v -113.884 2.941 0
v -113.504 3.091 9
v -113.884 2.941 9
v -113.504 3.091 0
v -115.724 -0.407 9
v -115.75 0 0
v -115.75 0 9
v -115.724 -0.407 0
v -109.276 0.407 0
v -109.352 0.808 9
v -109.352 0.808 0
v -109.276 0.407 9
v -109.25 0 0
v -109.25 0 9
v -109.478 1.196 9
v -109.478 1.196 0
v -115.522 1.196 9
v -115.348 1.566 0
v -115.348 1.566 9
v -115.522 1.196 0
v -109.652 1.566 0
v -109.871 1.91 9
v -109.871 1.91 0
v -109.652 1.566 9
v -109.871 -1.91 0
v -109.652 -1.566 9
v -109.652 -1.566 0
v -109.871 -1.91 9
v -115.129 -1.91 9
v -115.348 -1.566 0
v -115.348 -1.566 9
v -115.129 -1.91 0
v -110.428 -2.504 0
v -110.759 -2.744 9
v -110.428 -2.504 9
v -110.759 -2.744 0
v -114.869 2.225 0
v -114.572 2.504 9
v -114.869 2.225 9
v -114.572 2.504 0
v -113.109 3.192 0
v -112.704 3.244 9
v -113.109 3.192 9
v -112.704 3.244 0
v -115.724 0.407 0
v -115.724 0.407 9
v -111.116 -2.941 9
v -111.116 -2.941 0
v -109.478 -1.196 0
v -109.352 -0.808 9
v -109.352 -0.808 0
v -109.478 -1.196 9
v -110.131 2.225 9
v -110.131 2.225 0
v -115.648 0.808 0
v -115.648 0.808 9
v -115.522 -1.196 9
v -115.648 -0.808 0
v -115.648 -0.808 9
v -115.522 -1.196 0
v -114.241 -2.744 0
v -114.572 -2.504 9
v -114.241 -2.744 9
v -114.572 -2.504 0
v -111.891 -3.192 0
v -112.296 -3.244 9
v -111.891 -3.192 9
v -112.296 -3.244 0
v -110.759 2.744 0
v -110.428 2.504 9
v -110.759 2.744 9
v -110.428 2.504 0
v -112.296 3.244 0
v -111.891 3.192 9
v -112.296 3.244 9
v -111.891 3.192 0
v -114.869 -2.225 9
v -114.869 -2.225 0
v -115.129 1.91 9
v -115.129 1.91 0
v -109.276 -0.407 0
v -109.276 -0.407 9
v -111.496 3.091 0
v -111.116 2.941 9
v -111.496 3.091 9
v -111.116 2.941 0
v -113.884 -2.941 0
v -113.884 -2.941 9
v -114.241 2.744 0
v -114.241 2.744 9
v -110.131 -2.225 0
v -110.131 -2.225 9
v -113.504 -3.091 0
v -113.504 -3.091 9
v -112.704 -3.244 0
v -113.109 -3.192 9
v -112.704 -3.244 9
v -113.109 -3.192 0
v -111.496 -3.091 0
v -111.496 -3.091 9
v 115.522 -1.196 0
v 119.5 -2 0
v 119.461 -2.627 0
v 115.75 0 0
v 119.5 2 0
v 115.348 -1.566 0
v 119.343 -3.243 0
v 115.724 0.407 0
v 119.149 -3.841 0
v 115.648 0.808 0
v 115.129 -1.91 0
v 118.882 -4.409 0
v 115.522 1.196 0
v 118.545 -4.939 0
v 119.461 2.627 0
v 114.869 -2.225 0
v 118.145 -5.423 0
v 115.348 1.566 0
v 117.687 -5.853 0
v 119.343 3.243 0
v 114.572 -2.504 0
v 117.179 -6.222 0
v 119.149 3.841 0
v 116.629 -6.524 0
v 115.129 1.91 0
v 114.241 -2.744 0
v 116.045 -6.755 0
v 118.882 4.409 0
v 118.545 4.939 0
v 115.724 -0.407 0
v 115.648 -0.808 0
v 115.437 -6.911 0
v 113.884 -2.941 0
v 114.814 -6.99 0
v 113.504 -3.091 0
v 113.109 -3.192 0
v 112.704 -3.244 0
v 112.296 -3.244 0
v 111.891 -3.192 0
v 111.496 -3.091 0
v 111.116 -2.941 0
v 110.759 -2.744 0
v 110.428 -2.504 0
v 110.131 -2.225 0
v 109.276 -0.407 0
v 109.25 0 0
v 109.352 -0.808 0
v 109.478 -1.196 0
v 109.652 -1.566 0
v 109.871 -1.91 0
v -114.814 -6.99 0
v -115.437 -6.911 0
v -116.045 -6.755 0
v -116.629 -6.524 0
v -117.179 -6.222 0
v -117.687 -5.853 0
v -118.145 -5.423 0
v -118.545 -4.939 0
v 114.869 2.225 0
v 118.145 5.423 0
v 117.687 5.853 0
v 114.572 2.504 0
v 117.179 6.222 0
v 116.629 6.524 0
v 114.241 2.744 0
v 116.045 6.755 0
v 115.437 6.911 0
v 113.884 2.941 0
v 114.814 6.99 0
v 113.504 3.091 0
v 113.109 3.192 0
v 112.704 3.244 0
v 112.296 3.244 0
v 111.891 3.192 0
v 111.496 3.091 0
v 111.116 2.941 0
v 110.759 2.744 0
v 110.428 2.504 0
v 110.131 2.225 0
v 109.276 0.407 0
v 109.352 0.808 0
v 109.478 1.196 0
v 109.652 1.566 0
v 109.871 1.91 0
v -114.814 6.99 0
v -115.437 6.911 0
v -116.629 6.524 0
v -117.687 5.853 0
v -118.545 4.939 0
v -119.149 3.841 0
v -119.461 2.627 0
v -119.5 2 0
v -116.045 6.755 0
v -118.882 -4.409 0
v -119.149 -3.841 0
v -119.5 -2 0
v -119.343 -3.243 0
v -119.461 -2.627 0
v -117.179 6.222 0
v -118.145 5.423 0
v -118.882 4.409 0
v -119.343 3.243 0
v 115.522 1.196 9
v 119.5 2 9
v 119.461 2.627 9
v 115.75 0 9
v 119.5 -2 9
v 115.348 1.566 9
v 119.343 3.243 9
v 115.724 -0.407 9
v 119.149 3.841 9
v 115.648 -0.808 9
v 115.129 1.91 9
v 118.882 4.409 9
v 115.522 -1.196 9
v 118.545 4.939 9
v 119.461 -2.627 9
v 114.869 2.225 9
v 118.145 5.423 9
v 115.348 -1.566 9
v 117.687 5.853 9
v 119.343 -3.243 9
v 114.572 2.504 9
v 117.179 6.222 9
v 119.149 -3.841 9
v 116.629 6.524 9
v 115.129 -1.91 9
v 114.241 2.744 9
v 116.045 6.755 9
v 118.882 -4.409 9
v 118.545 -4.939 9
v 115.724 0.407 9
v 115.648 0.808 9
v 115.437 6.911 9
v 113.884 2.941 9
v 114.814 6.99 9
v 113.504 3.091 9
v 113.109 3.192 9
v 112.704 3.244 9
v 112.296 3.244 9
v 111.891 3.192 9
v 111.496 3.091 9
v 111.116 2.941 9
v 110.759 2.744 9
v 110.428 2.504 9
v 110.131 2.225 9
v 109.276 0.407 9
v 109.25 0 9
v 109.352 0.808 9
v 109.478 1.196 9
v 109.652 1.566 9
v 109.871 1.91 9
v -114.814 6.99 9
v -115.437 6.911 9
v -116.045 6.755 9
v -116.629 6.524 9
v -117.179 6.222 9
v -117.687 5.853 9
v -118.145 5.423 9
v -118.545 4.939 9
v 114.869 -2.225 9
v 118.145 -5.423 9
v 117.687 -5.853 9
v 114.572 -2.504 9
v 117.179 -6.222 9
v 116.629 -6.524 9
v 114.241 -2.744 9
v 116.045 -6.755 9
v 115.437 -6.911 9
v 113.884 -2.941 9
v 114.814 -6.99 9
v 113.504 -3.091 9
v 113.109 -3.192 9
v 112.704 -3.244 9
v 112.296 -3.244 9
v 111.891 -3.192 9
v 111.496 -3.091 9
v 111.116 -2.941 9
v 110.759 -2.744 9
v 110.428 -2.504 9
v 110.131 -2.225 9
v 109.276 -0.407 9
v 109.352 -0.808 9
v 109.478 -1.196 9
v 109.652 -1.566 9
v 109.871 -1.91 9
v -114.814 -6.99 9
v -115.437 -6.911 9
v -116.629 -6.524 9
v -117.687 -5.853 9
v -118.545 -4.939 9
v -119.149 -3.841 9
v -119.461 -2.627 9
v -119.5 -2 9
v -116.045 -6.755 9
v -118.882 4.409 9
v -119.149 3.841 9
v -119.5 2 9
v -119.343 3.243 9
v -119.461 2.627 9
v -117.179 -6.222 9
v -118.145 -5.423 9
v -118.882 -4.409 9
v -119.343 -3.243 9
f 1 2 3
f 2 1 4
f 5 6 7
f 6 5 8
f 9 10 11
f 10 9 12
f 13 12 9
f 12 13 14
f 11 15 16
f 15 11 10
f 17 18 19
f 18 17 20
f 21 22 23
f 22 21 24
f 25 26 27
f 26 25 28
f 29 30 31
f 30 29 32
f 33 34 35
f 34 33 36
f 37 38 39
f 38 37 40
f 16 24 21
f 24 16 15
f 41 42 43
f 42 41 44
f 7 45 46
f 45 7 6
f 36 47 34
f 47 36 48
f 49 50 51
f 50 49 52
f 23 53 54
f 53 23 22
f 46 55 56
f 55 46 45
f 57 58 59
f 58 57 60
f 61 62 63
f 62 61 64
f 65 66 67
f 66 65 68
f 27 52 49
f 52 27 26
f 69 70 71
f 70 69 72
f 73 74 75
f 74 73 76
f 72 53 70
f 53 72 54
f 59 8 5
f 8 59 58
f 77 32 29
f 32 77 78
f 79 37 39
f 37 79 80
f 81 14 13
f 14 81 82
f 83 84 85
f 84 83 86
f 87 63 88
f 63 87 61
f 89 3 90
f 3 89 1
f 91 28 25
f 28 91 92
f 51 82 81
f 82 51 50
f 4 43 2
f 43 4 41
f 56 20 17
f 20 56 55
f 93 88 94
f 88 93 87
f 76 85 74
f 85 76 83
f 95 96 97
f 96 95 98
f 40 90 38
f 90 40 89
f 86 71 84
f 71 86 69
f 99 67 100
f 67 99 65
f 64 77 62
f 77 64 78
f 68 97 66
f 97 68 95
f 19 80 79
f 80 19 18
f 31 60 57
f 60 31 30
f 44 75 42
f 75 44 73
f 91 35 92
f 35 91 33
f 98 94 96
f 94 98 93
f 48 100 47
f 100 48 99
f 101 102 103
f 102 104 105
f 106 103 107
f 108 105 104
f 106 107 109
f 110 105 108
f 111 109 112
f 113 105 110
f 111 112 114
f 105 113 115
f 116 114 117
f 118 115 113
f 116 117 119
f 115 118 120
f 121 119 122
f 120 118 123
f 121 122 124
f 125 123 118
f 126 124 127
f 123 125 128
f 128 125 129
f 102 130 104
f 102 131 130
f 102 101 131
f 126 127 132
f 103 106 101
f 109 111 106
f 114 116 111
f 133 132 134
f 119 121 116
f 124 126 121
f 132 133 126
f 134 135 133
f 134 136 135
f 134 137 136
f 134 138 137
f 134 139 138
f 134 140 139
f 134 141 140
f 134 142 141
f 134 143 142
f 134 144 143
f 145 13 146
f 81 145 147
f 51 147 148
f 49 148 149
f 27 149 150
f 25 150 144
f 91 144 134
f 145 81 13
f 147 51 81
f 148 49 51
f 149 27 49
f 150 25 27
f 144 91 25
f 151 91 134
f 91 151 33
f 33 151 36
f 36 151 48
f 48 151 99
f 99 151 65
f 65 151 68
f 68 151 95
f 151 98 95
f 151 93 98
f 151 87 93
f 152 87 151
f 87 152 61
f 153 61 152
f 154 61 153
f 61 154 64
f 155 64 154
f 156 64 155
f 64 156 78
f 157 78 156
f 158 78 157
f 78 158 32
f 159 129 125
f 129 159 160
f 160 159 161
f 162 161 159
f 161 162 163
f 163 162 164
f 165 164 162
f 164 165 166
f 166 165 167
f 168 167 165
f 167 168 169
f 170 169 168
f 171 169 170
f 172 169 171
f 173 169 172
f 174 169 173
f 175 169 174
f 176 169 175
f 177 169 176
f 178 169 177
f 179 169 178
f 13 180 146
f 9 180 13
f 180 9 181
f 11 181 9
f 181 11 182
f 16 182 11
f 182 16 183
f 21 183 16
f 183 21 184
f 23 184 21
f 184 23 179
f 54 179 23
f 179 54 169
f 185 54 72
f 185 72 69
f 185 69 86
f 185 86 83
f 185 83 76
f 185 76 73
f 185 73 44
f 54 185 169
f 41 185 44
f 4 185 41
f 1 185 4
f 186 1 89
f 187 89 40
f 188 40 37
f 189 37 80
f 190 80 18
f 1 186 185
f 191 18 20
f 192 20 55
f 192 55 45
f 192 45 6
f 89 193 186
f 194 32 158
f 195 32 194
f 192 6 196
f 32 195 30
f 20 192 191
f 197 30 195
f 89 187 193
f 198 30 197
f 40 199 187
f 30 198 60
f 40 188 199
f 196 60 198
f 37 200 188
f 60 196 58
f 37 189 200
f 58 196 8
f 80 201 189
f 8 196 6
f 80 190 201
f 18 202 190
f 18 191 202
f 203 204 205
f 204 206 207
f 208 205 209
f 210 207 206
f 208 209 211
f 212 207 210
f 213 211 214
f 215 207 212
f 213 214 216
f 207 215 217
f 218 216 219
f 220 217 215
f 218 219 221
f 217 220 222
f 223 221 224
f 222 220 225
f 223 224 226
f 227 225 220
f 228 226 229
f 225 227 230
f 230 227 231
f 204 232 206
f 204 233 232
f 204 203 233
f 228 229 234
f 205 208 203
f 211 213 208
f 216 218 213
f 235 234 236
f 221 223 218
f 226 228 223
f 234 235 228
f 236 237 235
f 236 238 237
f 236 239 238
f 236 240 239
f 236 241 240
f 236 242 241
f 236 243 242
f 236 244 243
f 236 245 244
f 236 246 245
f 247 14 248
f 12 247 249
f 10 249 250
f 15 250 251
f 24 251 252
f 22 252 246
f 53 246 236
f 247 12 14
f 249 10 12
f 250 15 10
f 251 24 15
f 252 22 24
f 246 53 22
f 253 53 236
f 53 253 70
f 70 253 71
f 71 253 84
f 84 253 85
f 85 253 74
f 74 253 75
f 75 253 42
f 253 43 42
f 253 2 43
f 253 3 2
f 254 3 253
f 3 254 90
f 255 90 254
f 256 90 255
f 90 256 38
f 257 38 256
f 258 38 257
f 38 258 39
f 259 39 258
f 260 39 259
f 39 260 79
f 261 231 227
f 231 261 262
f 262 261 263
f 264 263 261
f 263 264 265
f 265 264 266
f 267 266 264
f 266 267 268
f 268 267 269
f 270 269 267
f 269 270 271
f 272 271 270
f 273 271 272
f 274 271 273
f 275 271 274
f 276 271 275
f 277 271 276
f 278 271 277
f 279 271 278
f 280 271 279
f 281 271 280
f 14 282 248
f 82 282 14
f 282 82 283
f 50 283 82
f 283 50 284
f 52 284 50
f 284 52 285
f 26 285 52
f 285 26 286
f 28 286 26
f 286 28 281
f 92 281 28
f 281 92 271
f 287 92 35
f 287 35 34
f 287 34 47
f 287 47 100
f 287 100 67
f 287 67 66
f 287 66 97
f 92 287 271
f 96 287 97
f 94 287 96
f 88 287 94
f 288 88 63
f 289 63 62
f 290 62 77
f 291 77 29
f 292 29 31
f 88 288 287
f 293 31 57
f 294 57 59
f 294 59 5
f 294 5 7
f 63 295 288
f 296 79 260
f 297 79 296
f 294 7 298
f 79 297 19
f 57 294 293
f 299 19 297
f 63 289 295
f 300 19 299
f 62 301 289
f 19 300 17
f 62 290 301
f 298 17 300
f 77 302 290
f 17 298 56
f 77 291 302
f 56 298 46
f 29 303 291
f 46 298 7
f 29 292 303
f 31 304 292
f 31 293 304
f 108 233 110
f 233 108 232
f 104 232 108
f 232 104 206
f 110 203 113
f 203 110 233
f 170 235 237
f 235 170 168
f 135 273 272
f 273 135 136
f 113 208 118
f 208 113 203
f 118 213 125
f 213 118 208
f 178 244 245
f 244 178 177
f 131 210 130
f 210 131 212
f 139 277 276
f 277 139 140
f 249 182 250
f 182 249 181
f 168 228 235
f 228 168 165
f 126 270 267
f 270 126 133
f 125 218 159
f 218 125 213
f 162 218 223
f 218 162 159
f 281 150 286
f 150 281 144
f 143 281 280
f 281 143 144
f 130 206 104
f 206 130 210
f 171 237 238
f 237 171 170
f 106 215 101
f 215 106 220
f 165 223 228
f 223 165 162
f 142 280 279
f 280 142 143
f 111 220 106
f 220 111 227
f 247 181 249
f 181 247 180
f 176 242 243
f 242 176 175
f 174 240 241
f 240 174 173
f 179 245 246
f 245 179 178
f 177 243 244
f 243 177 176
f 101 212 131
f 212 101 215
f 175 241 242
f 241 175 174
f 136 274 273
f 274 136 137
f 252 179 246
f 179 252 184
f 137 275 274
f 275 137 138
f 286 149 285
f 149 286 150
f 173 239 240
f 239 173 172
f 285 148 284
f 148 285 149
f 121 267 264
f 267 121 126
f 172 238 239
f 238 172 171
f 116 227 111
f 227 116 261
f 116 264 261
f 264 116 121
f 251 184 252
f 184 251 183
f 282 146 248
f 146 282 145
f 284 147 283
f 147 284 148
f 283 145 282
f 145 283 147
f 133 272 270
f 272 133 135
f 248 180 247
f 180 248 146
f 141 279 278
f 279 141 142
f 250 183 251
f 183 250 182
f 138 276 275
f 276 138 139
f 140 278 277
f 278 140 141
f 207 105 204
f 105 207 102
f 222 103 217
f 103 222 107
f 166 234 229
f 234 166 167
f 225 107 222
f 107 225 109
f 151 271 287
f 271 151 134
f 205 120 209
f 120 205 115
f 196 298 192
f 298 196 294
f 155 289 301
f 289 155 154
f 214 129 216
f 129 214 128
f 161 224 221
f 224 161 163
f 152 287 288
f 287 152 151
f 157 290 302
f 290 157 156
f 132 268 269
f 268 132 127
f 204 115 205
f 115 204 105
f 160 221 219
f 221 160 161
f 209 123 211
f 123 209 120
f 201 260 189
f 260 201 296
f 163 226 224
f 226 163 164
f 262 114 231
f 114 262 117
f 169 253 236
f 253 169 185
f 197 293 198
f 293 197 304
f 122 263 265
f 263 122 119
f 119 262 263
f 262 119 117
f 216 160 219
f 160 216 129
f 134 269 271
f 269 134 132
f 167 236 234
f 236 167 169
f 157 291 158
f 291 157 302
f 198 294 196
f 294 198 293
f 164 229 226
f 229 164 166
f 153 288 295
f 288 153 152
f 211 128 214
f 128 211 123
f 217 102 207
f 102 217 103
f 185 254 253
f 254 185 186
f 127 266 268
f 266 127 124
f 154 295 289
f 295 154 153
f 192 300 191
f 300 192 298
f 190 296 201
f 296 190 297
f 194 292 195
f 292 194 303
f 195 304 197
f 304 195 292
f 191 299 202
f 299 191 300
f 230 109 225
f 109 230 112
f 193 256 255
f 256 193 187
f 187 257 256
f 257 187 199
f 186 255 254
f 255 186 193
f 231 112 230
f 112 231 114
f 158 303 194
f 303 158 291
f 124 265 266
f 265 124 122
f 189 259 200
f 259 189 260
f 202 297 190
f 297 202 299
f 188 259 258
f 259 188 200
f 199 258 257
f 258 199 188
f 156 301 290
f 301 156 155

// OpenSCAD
$fn = 50;


difference() {
	union() {
		hull() {
			translate(v = [-114.5000000000, 2.0000000000, 0]) {
				cylinder(h = 9, r = 5);
			}
			translate(v = [114.5000000000, 2.0000000000, 0]) {
				cylinder(h = 9, r = 5);
			}
			translate(v = [-114.5000000000, -2.0000000000, 0]) {
				cylinder(h = 9, r = 5);
			}
			translate(v = [114.5000000000, -2.0000000000, 0]) {
				cylinder(h = 9, r = 5);
			}
		}
	}
	union() {
		translate(v = [-112.5000000000, 0.0000000000, 0]) {
			cylinder(h = 9, r = 3.2500000000);
		}
		translate(v = [112.5000000000, 0.0000000000, 0]) {
			cylinder(h = 9, r = 3.2500000000);
		}
		translate(v = [-112.5000000000, 0.0000000000, 0]) {
			cylinder(h = 9, r = 1.8000000000);
		}
		translate(v = [112.5000000000, 0.0000000000, 0]) {
			cylinder(h = 9, r = 1.8000000000);
		}
		translate(v = [-112.5000000000, 0.0000000000, 0]) {
			cylinder(h = 9, r = 1.8000000000);
		}
		translate(v = [112.5000000000, 0.0000000000, 0]) {
			cylinder(h = 9, r = 1.8000000000);
		}
		translate(v = [-112.5000000000, 0.0000000000, 0]) {
			cylinder(h = 9, r = 1.8000000000);
		}
		translate(v = [112.5000000000, 0.0000000000, 0]) {
			cylinder(h = 9, r = 1.8000000000);
		}
	}
}
